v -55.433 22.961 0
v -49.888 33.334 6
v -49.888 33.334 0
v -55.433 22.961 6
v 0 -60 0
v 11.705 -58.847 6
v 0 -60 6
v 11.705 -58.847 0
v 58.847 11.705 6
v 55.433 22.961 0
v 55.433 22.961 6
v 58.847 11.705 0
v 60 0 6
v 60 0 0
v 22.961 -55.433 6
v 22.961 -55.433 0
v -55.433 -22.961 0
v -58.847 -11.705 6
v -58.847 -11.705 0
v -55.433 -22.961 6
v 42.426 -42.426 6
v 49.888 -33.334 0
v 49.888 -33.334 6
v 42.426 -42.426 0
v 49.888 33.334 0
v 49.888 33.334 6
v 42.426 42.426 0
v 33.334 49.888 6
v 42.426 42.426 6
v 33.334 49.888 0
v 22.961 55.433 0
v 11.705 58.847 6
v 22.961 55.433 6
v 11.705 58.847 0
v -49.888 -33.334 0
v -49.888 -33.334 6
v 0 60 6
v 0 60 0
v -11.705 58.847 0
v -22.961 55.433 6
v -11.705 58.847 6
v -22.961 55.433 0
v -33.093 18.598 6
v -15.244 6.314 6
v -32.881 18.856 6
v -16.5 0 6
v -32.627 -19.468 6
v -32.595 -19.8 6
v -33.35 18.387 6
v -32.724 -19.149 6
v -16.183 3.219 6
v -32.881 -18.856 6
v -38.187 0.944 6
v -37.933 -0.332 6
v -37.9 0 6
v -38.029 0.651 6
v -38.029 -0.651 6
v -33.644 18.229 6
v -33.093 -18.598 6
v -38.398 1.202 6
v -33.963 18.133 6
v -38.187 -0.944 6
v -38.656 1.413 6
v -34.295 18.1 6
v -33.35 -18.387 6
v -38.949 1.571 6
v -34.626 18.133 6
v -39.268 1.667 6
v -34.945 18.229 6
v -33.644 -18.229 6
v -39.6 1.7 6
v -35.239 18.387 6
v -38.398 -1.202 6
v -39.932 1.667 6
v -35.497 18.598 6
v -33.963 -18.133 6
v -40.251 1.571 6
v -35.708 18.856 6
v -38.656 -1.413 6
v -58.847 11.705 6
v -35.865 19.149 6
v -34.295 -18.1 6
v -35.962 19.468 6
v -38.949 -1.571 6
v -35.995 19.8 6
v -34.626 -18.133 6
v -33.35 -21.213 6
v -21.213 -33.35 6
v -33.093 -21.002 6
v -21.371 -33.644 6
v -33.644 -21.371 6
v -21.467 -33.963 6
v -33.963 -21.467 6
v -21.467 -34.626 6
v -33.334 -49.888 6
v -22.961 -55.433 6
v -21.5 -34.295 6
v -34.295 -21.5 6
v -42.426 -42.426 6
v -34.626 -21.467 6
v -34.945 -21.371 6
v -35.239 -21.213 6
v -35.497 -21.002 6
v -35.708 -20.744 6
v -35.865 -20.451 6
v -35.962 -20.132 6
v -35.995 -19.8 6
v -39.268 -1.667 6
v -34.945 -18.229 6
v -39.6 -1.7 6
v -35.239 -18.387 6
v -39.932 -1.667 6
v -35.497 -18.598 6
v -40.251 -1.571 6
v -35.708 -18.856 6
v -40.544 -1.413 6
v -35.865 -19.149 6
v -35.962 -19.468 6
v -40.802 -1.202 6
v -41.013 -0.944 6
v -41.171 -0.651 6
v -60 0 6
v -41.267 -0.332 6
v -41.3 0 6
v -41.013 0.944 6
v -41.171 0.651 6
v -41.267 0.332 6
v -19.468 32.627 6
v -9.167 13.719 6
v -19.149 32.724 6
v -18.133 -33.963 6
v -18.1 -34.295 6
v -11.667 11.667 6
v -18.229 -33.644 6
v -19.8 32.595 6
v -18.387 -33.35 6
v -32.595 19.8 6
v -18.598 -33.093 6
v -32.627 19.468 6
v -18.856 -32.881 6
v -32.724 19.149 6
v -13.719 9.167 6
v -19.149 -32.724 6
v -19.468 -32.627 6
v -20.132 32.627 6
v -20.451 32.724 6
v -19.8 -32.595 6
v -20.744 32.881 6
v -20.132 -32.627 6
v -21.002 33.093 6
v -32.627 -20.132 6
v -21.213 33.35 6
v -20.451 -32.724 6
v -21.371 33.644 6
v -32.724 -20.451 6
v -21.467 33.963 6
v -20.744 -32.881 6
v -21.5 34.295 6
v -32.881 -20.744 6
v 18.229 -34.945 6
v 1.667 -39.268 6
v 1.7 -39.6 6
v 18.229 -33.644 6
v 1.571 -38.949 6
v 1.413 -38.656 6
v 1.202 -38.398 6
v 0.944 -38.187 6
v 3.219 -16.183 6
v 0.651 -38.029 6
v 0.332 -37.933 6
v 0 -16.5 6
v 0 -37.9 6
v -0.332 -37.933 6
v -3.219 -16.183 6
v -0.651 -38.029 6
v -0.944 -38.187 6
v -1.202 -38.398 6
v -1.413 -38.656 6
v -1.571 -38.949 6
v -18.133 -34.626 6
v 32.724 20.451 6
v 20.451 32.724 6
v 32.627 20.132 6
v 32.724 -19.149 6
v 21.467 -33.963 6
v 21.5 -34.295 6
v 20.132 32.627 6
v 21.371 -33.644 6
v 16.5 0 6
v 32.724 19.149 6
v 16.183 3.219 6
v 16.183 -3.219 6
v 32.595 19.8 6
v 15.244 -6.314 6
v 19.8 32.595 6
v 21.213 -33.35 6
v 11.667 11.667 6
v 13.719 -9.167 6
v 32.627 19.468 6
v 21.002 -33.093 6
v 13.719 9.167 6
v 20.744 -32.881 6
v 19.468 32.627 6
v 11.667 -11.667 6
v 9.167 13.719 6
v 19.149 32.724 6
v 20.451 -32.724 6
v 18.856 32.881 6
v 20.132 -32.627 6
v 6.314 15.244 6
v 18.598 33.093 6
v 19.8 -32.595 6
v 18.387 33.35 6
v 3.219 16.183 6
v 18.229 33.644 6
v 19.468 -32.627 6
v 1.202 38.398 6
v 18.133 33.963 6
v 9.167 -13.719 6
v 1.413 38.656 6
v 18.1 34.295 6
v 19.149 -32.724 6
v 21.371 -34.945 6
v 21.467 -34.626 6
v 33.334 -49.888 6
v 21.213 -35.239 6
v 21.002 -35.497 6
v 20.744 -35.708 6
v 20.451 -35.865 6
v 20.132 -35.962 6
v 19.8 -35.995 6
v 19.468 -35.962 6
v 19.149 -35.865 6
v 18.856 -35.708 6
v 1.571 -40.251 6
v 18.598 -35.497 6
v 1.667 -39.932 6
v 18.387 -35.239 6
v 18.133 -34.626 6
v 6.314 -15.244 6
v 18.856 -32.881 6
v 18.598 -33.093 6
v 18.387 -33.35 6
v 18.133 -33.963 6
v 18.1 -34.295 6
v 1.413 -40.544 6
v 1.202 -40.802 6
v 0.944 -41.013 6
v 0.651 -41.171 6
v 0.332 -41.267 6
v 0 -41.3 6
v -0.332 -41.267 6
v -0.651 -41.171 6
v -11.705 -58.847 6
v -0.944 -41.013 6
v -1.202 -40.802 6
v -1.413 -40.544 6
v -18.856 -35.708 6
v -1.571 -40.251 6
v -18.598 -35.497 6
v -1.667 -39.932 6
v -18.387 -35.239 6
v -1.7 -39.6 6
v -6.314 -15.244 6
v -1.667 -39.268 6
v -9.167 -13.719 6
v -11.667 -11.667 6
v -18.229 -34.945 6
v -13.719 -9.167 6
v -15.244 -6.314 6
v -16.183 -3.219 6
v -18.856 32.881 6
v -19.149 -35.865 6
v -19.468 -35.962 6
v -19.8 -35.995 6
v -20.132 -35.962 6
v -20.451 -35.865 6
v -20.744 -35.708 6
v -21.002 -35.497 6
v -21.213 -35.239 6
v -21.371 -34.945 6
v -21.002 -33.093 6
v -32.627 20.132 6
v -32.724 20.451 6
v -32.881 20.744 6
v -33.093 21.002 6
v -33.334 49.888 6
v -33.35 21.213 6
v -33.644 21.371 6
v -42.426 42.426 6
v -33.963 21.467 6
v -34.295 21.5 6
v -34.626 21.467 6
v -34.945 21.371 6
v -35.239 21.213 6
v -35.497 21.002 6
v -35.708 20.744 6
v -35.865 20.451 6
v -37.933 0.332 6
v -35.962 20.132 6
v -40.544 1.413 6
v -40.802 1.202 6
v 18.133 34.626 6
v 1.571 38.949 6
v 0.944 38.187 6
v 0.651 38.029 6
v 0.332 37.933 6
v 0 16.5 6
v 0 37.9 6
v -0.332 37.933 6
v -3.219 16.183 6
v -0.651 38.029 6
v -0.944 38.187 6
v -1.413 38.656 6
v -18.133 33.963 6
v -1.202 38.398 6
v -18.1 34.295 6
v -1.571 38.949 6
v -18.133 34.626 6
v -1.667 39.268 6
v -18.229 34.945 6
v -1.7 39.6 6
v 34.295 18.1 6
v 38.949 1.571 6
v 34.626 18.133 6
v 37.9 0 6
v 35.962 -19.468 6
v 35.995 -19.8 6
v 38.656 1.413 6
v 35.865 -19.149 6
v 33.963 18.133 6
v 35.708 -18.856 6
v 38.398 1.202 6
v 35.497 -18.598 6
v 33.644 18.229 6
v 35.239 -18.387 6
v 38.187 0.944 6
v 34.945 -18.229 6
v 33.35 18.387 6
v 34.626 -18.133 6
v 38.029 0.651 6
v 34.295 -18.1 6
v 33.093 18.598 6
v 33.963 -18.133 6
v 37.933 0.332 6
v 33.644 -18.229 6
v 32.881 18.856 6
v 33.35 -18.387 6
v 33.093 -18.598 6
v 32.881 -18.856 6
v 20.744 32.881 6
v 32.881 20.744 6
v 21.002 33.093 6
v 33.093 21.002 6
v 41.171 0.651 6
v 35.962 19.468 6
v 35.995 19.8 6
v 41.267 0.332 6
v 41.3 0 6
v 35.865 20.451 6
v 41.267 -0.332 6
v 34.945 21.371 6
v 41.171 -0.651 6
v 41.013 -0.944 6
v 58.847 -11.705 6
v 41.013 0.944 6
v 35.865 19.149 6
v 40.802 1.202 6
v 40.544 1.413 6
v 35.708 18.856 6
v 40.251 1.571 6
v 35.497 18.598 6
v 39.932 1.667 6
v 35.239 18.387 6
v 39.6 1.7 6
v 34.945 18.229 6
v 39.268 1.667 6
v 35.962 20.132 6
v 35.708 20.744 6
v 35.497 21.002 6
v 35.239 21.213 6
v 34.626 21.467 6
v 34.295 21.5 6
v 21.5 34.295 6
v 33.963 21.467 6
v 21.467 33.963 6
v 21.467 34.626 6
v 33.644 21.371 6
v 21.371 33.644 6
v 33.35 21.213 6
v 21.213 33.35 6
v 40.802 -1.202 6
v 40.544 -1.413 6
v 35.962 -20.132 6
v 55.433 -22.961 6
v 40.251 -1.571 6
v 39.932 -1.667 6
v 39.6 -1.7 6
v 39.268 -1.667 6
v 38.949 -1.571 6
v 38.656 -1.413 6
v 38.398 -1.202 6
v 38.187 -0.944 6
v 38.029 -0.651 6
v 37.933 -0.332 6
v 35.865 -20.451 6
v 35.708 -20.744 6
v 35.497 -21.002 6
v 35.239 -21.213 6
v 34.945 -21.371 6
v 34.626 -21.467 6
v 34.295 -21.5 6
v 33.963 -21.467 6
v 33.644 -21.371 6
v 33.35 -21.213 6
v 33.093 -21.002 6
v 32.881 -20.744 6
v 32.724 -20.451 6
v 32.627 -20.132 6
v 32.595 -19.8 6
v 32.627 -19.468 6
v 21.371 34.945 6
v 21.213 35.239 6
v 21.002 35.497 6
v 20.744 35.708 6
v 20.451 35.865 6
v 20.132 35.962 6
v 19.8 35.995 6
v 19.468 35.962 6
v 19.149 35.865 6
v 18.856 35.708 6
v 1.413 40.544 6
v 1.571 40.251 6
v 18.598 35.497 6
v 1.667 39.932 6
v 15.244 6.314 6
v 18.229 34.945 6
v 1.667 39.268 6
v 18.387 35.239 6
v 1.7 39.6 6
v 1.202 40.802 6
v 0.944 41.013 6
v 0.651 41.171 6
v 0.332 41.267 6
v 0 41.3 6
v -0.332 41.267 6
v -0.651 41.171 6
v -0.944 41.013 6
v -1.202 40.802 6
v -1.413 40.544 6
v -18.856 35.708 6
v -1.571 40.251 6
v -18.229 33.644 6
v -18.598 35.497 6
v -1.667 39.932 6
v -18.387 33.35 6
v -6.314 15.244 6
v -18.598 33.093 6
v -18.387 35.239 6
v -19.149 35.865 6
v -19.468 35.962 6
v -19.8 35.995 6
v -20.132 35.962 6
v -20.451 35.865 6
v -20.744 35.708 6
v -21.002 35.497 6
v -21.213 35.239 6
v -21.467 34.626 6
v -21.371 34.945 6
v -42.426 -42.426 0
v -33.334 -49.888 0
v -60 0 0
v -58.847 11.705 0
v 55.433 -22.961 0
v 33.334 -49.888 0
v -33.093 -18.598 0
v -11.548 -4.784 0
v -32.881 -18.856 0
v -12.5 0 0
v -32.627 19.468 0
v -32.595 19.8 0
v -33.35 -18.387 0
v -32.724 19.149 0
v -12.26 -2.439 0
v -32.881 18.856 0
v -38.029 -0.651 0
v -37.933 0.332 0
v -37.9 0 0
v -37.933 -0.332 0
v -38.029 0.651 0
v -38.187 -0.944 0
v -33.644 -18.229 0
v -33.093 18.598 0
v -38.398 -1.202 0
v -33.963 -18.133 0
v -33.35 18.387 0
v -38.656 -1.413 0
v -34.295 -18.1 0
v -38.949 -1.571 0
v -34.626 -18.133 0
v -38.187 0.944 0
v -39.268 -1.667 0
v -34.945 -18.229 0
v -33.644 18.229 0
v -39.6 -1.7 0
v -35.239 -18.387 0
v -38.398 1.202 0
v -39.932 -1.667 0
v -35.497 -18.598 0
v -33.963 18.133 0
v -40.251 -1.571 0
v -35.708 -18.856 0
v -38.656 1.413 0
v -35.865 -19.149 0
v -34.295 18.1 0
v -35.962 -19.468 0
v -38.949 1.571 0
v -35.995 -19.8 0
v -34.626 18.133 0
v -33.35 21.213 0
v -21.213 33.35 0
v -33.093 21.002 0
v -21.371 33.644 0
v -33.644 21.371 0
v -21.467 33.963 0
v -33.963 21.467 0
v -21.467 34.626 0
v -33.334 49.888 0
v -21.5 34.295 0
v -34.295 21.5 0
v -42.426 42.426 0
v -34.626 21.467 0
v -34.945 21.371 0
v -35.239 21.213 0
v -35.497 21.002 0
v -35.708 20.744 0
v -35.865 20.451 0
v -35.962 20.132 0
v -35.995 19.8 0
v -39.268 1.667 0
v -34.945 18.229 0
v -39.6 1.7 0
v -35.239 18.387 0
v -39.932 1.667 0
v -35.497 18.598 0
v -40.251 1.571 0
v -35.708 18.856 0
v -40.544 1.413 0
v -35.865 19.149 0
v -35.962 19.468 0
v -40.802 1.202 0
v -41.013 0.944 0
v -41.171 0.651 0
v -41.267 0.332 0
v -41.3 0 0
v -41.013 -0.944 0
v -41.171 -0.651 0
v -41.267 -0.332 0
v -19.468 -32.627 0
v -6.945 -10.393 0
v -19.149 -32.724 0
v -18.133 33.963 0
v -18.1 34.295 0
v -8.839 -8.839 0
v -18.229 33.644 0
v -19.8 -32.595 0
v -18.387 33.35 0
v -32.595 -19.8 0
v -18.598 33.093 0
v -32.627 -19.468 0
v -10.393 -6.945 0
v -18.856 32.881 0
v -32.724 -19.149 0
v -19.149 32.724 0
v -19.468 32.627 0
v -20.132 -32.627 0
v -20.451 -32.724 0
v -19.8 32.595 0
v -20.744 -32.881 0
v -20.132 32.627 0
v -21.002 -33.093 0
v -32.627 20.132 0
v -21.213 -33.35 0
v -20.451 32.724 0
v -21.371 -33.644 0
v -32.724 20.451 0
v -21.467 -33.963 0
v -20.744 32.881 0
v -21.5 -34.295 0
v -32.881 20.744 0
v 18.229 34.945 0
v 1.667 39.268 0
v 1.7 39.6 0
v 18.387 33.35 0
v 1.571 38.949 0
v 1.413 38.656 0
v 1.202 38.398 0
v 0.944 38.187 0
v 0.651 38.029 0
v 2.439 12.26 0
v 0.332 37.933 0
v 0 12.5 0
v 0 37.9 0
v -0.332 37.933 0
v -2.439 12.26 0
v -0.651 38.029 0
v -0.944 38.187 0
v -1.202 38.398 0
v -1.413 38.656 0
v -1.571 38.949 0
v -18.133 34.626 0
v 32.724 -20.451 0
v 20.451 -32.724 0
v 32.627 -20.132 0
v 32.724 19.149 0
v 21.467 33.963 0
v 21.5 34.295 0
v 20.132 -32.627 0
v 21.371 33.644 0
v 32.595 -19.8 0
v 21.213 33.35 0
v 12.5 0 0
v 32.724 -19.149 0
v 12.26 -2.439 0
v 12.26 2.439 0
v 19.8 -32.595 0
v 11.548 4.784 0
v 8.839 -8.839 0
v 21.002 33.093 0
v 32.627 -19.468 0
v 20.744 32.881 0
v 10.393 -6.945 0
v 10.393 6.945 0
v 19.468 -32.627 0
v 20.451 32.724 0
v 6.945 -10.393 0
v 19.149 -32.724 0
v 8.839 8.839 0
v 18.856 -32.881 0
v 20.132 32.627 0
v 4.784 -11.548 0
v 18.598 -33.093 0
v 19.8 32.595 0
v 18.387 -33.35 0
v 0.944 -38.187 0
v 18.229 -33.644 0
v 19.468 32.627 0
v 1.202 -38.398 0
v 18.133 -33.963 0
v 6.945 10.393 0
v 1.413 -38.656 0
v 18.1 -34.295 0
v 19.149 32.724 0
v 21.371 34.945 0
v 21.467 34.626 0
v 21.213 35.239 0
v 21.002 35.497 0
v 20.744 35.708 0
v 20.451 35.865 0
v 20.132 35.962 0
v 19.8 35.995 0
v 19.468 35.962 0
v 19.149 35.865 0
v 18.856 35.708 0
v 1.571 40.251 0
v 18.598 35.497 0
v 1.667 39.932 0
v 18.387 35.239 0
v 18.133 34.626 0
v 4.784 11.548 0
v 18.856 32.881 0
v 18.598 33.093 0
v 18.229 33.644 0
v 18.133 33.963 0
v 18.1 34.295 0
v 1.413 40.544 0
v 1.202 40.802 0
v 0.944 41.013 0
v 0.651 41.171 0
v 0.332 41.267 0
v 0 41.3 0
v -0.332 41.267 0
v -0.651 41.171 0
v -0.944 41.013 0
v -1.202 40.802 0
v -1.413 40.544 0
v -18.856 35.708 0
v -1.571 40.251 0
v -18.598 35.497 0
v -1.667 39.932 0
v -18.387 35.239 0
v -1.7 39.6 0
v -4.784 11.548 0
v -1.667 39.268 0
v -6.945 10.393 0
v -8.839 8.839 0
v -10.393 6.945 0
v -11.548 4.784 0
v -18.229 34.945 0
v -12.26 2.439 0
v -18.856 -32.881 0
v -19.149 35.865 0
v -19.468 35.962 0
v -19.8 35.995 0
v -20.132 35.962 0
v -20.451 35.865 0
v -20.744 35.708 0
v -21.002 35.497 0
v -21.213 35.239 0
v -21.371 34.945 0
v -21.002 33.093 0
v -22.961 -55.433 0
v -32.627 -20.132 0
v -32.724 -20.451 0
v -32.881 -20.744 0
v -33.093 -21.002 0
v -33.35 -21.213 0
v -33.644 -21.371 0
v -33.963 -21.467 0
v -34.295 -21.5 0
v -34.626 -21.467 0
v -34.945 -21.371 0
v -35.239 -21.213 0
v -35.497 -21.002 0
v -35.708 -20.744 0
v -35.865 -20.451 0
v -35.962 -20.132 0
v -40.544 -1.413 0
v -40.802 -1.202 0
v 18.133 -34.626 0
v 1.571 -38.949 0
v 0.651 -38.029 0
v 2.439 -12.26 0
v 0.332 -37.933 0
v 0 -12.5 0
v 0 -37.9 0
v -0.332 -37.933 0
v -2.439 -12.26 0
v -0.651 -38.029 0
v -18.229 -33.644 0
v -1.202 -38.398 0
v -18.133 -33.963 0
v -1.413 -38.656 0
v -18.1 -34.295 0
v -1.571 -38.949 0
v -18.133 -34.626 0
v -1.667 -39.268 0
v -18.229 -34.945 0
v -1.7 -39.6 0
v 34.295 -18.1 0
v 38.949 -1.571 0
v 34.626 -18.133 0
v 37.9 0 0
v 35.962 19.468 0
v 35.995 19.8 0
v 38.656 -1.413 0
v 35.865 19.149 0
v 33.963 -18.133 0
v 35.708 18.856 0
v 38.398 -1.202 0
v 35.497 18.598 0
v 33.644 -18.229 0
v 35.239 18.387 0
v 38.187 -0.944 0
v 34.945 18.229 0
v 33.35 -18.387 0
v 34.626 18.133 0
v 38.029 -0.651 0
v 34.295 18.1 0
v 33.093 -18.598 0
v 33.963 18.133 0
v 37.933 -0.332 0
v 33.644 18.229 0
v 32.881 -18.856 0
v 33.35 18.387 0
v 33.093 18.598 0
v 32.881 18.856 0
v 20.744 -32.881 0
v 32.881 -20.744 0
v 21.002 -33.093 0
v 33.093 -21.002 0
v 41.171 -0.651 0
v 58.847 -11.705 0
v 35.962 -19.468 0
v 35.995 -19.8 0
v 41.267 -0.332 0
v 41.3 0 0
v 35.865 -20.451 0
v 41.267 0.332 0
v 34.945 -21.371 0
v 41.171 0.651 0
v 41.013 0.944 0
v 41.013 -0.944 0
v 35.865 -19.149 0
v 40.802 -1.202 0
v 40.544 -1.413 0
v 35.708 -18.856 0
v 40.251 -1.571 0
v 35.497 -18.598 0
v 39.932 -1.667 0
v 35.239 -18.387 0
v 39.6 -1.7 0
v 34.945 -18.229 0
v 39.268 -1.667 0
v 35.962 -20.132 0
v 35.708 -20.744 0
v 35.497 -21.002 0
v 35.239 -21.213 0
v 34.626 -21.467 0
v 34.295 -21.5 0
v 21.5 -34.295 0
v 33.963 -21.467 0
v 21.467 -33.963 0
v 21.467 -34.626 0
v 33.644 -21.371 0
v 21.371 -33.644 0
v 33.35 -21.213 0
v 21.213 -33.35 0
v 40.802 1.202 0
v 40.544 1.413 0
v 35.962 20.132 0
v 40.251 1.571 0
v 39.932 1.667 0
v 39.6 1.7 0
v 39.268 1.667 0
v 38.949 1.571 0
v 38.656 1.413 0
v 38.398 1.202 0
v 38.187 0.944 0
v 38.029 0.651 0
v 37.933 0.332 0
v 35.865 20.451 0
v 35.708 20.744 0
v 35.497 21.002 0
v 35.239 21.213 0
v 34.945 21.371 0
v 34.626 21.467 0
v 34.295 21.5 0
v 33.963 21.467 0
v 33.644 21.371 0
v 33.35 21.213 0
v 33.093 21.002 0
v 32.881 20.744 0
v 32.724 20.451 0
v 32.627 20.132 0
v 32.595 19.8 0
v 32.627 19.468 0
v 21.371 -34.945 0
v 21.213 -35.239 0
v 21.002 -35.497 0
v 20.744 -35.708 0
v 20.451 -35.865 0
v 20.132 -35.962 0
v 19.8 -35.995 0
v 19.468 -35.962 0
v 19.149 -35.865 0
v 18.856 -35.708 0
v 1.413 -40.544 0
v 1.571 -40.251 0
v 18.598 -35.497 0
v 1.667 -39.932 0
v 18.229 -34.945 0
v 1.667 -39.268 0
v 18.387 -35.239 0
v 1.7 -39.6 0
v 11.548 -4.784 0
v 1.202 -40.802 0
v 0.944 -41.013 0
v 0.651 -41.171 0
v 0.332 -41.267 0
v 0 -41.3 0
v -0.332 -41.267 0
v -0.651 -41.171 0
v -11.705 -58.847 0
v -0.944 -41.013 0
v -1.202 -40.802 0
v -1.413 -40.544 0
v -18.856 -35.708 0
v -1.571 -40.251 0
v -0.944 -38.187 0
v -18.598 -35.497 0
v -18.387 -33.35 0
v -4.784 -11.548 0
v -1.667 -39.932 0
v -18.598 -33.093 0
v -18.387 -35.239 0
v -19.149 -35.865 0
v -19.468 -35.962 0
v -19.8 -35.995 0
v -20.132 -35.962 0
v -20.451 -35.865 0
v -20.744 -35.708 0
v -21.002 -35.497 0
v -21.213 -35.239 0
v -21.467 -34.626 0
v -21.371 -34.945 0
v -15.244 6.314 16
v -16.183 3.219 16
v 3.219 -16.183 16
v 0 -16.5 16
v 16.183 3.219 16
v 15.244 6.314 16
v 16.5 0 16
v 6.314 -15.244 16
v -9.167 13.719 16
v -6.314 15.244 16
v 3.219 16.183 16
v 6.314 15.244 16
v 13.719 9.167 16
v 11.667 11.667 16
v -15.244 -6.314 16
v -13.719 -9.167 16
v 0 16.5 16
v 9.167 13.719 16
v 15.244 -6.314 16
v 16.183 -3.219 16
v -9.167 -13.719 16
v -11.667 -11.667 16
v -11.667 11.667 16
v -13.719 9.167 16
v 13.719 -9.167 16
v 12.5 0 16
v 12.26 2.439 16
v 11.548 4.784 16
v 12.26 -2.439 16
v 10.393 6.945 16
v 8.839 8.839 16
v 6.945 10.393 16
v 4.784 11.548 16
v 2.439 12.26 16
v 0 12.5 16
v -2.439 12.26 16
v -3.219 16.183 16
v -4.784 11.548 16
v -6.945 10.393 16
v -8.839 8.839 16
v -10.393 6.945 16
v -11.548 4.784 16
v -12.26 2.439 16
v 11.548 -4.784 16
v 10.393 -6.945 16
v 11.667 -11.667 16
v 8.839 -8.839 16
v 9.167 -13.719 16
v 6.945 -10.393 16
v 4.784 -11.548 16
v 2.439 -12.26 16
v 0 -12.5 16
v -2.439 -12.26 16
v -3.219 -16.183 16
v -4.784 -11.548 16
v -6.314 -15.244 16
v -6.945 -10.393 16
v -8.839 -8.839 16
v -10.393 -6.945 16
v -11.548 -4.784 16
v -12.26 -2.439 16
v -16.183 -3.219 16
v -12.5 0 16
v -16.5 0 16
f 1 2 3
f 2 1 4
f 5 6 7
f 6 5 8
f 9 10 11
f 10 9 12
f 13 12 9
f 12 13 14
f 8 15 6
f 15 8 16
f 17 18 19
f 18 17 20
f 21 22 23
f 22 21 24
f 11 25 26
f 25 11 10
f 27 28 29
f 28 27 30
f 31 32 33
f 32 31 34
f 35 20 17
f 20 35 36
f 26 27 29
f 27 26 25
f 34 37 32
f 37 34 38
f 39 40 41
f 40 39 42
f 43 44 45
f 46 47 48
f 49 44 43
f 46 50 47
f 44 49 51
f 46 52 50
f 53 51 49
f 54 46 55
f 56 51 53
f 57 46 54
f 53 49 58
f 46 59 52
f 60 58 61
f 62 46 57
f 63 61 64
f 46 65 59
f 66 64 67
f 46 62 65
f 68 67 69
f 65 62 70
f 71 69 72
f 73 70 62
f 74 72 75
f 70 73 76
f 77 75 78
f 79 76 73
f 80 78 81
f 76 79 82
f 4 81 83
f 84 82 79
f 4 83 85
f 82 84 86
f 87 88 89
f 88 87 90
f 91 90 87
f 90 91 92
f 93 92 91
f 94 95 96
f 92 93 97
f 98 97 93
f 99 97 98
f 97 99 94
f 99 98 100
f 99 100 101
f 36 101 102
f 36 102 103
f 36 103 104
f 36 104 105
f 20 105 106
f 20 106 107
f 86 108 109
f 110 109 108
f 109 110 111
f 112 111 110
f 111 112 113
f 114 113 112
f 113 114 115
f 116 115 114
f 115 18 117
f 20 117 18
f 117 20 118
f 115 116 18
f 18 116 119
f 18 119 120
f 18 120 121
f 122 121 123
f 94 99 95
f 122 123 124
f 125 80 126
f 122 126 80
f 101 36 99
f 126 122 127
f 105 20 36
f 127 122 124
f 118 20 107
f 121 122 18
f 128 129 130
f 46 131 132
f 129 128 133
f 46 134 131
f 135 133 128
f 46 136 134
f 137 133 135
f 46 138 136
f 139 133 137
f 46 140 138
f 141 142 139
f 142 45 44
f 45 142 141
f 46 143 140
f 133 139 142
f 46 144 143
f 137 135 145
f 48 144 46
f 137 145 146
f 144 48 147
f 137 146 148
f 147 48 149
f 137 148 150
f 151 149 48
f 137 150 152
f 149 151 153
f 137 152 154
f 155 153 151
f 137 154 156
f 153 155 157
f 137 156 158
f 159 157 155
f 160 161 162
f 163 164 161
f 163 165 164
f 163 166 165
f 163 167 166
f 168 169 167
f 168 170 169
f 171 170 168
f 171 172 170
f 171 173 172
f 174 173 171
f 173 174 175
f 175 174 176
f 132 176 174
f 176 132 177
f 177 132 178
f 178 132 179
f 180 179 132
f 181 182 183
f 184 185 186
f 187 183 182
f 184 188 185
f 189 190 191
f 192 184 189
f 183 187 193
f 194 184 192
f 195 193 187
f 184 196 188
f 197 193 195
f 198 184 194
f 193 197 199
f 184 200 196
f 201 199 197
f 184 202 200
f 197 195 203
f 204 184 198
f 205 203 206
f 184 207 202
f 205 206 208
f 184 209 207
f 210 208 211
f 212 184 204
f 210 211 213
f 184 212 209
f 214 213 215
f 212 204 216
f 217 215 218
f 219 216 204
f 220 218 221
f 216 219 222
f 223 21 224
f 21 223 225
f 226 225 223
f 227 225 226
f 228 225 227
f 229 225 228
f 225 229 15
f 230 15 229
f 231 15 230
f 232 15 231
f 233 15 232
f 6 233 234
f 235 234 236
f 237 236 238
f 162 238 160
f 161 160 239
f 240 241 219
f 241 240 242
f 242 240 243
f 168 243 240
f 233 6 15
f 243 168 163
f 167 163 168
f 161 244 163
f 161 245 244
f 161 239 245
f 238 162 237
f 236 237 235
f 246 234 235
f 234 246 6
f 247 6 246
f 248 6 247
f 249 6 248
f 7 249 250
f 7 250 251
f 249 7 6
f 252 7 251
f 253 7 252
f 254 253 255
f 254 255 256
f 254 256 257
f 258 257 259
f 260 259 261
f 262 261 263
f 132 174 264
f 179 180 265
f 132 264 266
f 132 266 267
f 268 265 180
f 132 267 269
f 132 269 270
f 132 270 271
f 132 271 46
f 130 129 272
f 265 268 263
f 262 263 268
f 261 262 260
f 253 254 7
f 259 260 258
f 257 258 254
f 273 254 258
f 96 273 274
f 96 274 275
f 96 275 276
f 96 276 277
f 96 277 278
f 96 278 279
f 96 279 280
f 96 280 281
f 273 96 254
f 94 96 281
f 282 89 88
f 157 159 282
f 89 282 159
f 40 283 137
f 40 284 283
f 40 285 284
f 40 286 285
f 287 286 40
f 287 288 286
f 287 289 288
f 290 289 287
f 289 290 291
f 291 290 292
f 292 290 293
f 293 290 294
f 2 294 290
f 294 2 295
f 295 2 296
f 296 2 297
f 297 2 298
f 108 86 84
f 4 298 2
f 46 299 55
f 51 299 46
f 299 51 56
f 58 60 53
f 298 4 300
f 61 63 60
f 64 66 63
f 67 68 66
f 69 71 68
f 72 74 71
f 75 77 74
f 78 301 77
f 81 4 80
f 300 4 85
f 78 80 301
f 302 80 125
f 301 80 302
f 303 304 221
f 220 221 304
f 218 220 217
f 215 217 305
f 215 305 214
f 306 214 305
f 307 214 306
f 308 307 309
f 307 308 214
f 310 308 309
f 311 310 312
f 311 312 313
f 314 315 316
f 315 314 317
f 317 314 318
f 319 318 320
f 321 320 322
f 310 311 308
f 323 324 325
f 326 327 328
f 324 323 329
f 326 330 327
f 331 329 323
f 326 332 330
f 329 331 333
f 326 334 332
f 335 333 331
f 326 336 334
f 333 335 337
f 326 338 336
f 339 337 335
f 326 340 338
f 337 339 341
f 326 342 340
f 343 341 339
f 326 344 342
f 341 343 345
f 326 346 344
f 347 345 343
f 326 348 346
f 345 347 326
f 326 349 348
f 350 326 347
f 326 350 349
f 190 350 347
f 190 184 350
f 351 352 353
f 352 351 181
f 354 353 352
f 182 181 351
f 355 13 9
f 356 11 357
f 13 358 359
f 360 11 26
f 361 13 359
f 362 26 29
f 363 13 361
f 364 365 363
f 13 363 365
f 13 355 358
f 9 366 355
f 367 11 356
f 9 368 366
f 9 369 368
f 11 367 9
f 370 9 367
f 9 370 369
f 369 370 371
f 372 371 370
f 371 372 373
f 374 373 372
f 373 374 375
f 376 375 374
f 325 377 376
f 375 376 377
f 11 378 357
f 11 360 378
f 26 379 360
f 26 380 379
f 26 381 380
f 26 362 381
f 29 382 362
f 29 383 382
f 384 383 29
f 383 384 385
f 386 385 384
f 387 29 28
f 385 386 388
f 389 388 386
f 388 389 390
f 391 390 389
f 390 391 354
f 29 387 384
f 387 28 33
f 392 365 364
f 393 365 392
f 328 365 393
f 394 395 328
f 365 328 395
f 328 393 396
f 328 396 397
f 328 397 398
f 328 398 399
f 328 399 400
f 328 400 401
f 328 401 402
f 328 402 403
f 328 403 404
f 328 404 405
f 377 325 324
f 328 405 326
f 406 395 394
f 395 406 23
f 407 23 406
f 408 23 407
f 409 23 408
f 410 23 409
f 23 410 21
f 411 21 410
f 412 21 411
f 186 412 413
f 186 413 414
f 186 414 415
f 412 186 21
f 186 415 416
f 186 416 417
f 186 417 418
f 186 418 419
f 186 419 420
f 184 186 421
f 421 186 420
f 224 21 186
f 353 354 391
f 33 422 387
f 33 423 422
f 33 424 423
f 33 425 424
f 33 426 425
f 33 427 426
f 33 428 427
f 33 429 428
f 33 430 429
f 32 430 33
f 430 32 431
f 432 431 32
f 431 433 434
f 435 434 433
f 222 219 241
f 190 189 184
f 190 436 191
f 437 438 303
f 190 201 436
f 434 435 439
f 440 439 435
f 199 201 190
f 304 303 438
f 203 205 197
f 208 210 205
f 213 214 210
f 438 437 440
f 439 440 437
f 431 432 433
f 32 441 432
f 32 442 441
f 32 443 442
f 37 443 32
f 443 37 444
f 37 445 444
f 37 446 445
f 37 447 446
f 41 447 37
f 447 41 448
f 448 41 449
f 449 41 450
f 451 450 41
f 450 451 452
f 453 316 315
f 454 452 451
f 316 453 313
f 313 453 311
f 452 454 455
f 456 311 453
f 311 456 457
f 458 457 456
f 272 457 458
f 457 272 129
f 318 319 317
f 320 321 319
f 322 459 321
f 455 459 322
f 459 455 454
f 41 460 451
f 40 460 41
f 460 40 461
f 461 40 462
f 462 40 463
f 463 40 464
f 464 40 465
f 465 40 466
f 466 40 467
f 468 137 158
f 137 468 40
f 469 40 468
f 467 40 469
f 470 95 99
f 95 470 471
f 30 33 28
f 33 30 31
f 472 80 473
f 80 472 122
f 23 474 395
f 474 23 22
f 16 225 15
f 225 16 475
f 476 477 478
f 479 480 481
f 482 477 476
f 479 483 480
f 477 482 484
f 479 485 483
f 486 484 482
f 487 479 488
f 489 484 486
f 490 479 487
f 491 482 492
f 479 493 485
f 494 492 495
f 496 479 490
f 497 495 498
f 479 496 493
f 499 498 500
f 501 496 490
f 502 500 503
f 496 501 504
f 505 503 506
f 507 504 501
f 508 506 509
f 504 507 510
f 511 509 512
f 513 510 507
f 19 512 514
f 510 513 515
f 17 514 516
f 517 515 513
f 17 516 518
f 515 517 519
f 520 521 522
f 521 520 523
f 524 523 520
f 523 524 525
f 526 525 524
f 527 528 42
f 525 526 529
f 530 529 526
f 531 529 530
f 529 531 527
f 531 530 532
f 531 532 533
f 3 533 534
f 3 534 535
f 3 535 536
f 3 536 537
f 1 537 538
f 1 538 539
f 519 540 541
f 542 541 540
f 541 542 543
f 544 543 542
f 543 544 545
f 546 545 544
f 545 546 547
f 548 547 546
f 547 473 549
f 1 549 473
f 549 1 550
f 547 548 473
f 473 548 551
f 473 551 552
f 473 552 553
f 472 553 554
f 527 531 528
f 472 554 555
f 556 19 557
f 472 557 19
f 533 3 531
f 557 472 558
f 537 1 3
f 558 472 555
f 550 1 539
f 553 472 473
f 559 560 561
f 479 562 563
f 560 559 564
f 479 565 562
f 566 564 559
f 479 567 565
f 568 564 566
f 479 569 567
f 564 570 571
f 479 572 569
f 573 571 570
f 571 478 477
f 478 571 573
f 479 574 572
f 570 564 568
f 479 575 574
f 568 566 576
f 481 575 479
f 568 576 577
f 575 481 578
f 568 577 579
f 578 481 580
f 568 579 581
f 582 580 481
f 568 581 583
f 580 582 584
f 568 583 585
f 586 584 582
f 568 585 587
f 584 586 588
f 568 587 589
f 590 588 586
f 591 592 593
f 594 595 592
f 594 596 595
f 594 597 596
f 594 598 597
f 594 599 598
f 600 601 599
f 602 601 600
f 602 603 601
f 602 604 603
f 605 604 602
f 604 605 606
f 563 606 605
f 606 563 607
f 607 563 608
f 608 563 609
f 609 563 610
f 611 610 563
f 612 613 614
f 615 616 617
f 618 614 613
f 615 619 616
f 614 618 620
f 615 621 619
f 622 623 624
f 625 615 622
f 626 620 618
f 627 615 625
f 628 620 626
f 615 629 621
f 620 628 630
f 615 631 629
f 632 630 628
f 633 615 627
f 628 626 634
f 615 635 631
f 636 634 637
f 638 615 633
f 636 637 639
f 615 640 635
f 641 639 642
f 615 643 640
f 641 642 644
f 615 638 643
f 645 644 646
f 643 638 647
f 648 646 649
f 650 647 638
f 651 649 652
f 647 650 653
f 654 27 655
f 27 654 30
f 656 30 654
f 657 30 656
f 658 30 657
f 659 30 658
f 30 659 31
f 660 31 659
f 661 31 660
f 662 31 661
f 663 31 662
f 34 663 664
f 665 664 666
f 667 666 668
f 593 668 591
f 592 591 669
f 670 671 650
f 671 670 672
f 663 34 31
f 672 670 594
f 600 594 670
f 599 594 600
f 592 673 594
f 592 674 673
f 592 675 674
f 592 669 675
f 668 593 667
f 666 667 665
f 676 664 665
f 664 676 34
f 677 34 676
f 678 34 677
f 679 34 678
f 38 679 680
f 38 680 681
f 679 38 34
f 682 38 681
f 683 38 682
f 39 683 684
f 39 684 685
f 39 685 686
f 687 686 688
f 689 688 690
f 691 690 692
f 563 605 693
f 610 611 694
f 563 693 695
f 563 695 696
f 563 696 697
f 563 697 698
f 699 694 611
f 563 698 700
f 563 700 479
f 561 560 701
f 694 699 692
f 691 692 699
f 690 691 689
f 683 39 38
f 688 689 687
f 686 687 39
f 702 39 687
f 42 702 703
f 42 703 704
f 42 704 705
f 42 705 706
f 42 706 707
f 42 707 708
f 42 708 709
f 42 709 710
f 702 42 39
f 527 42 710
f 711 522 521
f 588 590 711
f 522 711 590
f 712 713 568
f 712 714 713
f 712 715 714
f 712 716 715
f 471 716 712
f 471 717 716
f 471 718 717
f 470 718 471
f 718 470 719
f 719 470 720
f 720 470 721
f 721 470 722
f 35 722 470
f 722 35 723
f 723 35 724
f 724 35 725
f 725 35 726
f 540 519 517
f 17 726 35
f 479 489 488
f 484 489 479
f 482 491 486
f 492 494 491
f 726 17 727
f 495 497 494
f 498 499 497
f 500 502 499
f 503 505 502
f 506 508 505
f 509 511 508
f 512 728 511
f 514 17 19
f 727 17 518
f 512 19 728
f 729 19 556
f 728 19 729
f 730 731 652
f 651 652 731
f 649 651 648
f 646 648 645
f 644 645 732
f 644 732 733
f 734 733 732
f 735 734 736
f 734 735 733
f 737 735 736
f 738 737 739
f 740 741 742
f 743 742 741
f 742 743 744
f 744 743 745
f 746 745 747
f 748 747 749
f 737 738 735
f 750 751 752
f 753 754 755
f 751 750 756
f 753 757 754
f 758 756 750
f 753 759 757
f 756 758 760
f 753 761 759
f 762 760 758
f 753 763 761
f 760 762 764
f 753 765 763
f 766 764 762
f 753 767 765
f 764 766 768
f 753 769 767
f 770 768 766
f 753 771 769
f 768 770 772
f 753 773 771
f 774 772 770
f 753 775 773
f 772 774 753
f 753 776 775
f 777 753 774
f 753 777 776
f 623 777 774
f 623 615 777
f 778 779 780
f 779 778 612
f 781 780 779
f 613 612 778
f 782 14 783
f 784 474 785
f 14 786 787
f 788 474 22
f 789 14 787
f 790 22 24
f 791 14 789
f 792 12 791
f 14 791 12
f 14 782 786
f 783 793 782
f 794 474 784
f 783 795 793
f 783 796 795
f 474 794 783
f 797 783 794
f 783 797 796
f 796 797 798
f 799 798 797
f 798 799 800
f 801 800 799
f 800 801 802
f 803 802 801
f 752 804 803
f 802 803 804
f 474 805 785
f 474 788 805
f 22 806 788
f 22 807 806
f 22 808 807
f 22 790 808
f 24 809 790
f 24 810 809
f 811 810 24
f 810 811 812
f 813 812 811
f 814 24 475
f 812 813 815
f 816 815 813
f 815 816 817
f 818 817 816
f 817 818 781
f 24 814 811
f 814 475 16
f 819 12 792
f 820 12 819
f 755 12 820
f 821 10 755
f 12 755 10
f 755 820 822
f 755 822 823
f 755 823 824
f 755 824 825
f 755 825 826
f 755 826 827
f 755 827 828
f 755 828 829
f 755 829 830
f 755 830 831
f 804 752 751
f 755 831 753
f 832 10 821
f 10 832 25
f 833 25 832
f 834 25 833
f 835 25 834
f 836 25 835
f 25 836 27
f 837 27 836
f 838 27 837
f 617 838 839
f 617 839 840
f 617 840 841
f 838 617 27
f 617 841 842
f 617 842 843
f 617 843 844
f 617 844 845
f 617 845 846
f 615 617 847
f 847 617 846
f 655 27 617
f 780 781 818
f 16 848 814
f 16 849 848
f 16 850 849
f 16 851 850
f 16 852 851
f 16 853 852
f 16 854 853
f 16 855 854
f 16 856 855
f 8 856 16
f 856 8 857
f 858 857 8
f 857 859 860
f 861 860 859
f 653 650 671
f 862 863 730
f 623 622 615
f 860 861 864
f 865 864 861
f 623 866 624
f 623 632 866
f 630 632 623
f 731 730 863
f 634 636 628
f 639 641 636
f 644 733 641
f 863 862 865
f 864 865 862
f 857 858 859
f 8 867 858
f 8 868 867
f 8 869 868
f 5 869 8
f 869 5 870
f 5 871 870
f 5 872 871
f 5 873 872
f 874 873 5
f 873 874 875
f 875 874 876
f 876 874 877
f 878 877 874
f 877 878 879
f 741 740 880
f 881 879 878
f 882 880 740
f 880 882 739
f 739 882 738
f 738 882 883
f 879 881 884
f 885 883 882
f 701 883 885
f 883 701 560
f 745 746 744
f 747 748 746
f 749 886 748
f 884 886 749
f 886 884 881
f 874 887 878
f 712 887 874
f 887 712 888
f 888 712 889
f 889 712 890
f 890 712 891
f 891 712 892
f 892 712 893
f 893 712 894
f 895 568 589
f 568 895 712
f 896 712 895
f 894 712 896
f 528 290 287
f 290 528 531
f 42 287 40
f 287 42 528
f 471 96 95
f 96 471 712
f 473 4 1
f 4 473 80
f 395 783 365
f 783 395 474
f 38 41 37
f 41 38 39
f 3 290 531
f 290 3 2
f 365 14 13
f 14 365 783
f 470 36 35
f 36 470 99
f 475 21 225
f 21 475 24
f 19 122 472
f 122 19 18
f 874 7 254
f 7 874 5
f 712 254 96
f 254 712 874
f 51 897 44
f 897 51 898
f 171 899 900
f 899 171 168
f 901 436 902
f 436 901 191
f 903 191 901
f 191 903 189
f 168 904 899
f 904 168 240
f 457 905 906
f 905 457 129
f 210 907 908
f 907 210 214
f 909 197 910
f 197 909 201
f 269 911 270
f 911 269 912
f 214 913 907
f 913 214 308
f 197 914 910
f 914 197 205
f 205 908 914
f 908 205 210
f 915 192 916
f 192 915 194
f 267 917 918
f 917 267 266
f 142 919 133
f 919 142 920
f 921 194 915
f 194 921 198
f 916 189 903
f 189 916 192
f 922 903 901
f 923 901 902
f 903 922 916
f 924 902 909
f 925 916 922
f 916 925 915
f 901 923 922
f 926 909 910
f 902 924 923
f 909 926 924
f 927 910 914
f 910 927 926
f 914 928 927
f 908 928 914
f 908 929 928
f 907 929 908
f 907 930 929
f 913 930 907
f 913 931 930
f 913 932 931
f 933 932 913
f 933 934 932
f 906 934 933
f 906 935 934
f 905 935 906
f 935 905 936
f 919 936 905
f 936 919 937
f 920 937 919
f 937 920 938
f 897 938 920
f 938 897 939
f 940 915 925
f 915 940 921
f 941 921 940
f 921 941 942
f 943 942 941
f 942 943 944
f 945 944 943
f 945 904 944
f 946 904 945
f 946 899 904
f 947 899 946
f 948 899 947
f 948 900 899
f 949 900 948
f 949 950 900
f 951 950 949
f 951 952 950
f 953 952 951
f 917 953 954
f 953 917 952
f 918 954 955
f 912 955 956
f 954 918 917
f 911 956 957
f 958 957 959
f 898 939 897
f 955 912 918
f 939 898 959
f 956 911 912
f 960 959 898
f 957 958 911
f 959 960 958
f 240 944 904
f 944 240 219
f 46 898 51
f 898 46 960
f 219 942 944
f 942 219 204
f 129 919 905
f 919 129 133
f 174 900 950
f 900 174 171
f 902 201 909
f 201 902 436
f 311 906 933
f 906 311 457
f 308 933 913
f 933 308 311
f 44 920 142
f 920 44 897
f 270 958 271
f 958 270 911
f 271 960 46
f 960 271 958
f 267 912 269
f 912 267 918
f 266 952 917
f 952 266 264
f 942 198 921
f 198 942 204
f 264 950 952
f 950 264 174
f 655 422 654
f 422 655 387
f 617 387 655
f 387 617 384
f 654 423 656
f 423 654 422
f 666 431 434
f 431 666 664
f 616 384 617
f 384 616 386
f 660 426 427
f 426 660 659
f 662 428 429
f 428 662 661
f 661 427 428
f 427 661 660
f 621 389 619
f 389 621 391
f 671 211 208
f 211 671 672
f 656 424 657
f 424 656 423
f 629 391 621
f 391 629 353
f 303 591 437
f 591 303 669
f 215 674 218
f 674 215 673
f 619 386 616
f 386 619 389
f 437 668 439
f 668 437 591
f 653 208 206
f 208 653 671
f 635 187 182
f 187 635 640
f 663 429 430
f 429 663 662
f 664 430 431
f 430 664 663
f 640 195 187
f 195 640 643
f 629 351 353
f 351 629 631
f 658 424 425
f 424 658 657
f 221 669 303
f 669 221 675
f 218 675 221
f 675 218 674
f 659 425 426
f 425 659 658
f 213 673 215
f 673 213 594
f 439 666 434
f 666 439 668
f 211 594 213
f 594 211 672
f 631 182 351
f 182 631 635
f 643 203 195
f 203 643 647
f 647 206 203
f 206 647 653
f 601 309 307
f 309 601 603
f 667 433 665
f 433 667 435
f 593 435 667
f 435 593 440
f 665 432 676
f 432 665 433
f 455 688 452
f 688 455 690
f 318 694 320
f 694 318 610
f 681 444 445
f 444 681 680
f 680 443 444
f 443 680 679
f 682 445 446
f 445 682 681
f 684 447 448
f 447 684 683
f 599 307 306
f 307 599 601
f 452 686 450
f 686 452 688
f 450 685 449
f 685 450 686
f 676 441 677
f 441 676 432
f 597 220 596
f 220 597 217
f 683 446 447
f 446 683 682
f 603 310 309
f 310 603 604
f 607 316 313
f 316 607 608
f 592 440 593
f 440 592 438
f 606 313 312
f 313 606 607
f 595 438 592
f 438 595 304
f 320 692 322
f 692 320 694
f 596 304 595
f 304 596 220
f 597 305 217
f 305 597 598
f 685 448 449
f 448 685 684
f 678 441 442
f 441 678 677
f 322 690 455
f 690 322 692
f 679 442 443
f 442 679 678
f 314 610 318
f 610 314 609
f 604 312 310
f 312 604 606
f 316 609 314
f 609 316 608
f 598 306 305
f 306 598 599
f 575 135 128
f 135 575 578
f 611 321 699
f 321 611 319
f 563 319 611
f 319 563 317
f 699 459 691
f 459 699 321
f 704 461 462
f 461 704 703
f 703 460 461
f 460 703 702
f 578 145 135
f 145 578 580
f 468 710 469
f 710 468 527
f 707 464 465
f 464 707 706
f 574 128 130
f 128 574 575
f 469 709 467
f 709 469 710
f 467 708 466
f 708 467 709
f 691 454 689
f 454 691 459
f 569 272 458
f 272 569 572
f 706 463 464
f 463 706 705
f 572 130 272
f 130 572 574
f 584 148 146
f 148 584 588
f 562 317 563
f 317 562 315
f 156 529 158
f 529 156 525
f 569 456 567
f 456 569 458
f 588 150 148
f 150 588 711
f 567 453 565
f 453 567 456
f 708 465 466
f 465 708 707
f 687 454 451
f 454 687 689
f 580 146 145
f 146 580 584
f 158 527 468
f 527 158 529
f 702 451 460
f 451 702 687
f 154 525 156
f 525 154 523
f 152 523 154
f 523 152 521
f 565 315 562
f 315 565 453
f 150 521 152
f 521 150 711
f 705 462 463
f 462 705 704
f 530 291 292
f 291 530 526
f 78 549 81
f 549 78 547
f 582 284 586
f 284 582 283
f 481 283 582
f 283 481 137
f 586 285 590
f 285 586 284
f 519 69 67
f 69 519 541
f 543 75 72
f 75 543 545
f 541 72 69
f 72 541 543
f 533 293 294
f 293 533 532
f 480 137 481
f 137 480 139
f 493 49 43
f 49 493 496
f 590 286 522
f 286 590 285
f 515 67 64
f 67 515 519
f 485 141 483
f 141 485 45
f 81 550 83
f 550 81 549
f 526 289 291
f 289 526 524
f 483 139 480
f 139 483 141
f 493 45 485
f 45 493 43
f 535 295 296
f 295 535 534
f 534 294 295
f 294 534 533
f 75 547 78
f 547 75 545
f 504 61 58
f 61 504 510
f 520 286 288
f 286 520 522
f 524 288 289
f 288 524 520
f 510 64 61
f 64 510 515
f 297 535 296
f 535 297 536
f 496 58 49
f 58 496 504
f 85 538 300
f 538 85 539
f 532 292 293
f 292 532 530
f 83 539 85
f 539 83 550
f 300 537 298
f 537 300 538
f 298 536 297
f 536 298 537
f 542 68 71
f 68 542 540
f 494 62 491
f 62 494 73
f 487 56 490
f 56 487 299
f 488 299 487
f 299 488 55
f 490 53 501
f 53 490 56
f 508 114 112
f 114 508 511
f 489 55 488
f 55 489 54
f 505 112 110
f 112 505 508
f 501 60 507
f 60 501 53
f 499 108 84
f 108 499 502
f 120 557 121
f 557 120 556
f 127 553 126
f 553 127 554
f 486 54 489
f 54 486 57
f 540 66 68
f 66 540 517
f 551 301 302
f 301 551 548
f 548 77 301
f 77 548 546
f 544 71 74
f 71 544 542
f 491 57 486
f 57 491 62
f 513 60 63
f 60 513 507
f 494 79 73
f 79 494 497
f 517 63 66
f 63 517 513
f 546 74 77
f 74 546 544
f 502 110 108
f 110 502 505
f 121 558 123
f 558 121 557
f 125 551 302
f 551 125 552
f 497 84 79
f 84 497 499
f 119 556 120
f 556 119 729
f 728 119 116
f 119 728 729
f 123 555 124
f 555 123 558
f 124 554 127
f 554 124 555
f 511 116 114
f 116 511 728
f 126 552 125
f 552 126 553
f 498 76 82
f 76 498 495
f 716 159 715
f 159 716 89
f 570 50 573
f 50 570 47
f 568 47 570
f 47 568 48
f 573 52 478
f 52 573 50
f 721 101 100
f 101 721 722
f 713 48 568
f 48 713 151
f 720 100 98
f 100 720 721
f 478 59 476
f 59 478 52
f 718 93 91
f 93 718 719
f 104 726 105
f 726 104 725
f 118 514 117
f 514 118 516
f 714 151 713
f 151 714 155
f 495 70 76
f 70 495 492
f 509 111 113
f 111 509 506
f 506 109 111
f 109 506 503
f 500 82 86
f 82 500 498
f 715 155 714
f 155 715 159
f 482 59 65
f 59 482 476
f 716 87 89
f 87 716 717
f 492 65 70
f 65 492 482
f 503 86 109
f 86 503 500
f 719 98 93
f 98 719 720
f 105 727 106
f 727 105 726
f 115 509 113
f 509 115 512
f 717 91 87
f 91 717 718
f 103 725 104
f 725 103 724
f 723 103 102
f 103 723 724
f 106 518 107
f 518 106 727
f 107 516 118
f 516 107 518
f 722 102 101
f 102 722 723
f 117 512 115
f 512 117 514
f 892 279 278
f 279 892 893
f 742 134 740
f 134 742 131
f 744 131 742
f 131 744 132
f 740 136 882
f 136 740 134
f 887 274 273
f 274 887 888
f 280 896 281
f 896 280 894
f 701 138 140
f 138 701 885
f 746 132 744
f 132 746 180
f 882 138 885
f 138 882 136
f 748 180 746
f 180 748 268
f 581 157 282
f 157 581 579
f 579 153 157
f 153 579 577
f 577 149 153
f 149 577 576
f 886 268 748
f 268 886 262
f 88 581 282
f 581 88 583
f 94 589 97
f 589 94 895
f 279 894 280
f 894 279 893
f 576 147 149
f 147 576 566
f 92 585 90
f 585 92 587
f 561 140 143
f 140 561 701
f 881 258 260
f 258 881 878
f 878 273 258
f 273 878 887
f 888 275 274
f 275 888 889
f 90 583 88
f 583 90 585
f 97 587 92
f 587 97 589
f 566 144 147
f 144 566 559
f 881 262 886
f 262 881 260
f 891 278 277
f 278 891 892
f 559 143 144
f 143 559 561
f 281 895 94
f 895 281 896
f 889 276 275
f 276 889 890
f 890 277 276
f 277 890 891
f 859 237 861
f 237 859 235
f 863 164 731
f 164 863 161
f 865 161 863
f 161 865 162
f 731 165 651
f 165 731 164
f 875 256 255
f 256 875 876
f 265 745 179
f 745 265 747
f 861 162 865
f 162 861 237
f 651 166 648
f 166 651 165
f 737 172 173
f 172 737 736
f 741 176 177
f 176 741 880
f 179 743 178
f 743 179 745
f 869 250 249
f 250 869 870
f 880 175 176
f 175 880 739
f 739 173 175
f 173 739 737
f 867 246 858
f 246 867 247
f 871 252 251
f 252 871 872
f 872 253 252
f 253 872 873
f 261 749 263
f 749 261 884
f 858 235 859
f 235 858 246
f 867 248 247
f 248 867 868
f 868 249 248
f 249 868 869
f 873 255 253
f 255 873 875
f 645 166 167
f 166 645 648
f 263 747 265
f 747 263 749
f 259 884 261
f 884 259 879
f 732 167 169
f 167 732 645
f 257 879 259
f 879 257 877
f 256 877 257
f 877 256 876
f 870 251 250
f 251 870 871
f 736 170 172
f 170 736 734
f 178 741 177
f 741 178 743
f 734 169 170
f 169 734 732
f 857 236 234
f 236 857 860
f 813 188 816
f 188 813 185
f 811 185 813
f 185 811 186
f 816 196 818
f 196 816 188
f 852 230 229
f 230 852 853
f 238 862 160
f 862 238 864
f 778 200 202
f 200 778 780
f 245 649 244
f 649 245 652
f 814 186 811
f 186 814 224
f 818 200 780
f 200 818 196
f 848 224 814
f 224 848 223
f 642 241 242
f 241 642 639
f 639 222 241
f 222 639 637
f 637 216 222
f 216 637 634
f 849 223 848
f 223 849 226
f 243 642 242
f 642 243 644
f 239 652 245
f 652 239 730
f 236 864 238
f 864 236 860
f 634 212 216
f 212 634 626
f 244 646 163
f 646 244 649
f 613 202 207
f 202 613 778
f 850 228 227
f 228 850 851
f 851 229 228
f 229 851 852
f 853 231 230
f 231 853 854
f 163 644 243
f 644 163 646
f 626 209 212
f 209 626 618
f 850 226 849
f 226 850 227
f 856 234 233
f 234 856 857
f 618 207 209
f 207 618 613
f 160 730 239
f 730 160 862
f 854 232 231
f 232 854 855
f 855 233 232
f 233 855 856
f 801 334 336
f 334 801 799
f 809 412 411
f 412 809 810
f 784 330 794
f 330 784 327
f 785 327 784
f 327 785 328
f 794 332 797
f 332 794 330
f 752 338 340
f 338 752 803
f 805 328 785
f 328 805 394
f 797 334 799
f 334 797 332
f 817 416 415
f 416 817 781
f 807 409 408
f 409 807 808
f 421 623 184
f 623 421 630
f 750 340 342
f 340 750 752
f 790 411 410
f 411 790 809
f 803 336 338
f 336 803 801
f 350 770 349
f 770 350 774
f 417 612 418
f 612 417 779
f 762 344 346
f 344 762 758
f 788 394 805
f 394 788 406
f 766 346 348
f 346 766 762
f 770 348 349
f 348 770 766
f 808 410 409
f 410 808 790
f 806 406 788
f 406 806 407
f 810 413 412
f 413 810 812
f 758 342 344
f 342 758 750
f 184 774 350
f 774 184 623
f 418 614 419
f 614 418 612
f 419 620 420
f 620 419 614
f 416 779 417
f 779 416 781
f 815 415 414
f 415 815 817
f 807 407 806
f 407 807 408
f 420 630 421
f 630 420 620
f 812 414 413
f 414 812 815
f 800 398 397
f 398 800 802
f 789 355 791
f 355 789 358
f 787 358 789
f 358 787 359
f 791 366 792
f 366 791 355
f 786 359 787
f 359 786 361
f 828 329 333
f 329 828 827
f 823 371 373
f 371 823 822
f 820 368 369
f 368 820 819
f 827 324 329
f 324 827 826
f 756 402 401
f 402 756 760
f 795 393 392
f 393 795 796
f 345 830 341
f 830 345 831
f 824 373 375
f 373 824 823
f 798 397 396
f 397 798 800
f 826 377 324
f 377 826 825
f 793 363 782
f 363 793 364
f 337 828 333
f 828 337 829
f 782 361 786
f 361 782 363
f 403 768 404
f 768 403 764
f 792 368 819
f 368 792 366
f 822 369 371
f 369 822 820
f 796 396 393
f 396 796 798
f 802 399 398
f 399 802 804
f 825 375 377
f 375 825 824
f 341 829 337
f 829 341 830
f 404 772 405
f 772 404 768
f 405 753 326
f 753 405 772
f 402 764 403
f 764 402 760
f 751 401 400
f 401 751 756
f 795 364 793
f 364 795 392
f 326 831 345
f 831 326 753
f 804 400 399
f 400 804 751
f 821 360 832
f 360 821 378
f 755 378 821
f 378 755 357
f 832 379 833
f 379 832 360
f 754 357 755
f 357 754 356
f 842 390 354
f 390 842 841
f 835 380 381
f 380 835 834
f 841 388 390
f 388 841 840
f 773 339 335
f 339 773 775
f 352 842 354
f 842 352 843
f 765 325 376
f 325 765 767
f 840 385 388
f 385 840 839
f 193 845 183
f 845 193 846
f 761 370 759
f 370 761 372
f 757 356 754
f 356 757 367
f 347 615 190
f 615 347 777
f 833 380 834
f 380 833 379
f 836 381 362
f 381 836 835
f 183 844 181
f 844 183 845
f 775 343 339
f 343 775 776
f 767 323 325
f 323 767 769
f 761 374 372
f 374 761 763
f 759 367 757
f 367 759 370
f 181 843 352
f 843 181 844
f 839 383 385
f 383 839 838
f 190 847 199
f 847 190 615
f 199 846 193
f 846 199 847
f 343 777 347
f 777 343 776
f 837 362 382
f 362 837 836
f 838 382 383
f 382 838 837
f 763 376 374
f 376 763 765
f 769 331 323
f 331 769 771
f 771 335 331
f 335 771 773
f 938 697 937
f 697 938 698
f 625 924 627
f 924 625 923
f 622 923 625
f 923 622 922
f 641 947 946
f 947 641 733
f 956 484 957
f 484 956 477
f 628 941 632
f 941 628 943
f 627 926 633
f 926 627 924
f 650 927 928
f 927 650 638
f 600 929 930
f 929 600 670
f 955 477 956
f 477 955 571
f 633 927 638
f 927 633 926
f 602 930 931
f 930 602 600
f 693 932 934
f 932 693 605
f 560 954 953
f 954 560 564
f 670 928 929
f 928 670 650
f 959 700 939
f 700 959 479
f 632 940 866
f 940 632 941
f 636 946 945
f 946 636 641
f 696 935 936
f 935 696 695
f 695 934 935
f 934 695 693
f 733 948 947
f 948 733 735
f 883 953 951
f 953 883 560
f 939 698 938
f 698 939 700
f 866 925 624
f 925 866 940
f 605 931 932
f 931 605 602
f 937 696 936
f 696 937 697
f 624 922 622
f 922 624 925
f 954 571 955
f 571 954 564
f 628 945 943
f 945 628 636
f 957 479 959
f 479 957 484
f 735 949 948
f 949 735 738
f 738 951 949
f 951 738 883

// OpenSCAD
$fn = 32;

// ----------------------------------------------------------------------
// Flange Ø120 x 6
// 12 holes on a Ø79.2 bolt circle, bolted joints
// ----------------------------------------------------------------------

// --- parameters (mm) ---
flange_d = 120;  // outside diameter of the flange
thickness = 6;   // flange thickness
holes = 12;      // number of bolt holes
pcd = 79.2;      // bolt circle diameter
start_deg = 60;  // angle of the first hole, from +X
hole_d = 3.4;    // bolt hole diameter
bore_d = 25;     // central through bore
hub_d = 33;      // hub outside diameter
hub_h = 10;      // hub height above the flange face (0 = no hub)

// --- derived feature positions (mm) ---
height = thickness + hub_h;  // = 16   overall height of the part
pcd_r = pcd / 2;             // = 39.6   bolt circle radius
hole_step = 360 / holes;     // = 30   angular pitch
feature_centers = [
  [pcd_r * cos(start_deg + 0 * hole_step), pcd_r * sin(start_deg + 0 * hole_step)],
  [pcd_r * cos(start_deg + 1 * hole_step), pcd_r * sin(start_deg + 1 * hole_step)],
  [pcd_r * cos(start_deg + 2 * hole_step), pcd_r * sin(start_deg + 2 * hole_step)],
  [pcd_r * cos(start_deg + 3 * hole_step), pcd_r * sin(start_deg + 3 * hole_step)],
  [pcd_r * cos(start_deg + 4 * hole_step), pcd_r * sin(start_deg + 4 * hole_step)],
  [pcd_r * cos(start_deg + 5 * hole_step), pcd_r * sin(start_deg + 5 * hole_step)],
  [pcd_r * cos(start_deg + 6 * hole_step), pcd_r * sin(start_deg + 6 * hole_step)],
  [pcd_r * cos(start_deg + 7 * hole_step), pcd_r * sin(start_deg + 7 * hole_step)],
  [pcd_r * cos(start_deg + 8 * hole_step), pcd_r * sin(start_deg + 8 * hole_step)],
  [pcd_r * cos(start_deg + 9 * hole_step), pcd_r * sin(start_deg + 9 * hole_step)],
  [pcd_r * cos(start_deg + 10 * hole_step), pcd_r * sin(start_deg + 10 * hole_step)],
  [pcd_r * cos(start_deg + 11 * hole_step), pcd_r * sin(start_deg + 11 * hole_step)]
];   // bolt hole centres on the pitch circle

// flange disc, every hole and the bore cut straight through
difference() {
  union() {
    cylinder(d = flange_d, h = thickness);
    cylinder(d = hub_d, h = height);  // hub, overlapped into the flange
  }
  translate([0, 0, -1]) cylinder(d = bore_d, h = height + 2);  // bore, through
  for (centre = feature_centers)
    translate([centre[0], centre[1], -1]) cylinder(d = hole_d, h = thickness + 2);
}
